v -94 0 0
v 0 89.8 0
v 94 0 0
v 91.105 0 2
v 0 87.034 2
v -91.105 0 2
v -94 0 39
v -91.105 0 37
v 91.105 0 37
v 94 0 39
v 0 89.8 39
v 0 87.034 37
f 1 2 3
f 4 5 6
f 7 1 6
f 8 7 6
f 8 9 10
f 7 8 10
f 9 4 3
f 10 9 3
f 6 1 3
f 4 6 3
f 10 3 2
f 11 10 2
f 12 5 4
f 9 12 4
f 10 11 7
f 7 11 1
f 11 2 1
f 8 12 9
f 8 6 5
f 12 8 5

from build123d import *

# Parameters (mm, degrees)
F1_DEPTH = 2
F3_DEPTH = 35
F5_DEPTH = 2


with BuildPart() as f1:
    # F0 (on Top) → F1 (new body)
    with BuildSketch(Plane.XY):
        Polygon((-94, 0), (94, 0), (0, 89.7997772826), align=None)
    extrude(amount=F1_DEPTH)

    # F2 (on face) → F3 (join)
    with BuildSketch(Plane.XY.offset(2)):
        Polygon((-91.1046698793, 0), (0, 87.0338198358), (91.1046698793, 0), (94, 0), (0, 89.7997772826), (-94, 0), align=None)
    extrude(amount=F3_DEPTH)

    # F4 (on face) → F5 (join)
    with BuildSketch(Plane.XY.offset(37)):
        Polygon((-91.1046698793, 0), (91.1046698793, 0), (0, 87.0338198358), align=None)
        Polygon((91.1046698793, 0), (94, 0), (0, 89.7997772826), (-94, 0), (-91.1046698793, 0), (0, 87.0338198358), align=None)
    extrude(amount=F5_DEPTH)


solid = f1.part
